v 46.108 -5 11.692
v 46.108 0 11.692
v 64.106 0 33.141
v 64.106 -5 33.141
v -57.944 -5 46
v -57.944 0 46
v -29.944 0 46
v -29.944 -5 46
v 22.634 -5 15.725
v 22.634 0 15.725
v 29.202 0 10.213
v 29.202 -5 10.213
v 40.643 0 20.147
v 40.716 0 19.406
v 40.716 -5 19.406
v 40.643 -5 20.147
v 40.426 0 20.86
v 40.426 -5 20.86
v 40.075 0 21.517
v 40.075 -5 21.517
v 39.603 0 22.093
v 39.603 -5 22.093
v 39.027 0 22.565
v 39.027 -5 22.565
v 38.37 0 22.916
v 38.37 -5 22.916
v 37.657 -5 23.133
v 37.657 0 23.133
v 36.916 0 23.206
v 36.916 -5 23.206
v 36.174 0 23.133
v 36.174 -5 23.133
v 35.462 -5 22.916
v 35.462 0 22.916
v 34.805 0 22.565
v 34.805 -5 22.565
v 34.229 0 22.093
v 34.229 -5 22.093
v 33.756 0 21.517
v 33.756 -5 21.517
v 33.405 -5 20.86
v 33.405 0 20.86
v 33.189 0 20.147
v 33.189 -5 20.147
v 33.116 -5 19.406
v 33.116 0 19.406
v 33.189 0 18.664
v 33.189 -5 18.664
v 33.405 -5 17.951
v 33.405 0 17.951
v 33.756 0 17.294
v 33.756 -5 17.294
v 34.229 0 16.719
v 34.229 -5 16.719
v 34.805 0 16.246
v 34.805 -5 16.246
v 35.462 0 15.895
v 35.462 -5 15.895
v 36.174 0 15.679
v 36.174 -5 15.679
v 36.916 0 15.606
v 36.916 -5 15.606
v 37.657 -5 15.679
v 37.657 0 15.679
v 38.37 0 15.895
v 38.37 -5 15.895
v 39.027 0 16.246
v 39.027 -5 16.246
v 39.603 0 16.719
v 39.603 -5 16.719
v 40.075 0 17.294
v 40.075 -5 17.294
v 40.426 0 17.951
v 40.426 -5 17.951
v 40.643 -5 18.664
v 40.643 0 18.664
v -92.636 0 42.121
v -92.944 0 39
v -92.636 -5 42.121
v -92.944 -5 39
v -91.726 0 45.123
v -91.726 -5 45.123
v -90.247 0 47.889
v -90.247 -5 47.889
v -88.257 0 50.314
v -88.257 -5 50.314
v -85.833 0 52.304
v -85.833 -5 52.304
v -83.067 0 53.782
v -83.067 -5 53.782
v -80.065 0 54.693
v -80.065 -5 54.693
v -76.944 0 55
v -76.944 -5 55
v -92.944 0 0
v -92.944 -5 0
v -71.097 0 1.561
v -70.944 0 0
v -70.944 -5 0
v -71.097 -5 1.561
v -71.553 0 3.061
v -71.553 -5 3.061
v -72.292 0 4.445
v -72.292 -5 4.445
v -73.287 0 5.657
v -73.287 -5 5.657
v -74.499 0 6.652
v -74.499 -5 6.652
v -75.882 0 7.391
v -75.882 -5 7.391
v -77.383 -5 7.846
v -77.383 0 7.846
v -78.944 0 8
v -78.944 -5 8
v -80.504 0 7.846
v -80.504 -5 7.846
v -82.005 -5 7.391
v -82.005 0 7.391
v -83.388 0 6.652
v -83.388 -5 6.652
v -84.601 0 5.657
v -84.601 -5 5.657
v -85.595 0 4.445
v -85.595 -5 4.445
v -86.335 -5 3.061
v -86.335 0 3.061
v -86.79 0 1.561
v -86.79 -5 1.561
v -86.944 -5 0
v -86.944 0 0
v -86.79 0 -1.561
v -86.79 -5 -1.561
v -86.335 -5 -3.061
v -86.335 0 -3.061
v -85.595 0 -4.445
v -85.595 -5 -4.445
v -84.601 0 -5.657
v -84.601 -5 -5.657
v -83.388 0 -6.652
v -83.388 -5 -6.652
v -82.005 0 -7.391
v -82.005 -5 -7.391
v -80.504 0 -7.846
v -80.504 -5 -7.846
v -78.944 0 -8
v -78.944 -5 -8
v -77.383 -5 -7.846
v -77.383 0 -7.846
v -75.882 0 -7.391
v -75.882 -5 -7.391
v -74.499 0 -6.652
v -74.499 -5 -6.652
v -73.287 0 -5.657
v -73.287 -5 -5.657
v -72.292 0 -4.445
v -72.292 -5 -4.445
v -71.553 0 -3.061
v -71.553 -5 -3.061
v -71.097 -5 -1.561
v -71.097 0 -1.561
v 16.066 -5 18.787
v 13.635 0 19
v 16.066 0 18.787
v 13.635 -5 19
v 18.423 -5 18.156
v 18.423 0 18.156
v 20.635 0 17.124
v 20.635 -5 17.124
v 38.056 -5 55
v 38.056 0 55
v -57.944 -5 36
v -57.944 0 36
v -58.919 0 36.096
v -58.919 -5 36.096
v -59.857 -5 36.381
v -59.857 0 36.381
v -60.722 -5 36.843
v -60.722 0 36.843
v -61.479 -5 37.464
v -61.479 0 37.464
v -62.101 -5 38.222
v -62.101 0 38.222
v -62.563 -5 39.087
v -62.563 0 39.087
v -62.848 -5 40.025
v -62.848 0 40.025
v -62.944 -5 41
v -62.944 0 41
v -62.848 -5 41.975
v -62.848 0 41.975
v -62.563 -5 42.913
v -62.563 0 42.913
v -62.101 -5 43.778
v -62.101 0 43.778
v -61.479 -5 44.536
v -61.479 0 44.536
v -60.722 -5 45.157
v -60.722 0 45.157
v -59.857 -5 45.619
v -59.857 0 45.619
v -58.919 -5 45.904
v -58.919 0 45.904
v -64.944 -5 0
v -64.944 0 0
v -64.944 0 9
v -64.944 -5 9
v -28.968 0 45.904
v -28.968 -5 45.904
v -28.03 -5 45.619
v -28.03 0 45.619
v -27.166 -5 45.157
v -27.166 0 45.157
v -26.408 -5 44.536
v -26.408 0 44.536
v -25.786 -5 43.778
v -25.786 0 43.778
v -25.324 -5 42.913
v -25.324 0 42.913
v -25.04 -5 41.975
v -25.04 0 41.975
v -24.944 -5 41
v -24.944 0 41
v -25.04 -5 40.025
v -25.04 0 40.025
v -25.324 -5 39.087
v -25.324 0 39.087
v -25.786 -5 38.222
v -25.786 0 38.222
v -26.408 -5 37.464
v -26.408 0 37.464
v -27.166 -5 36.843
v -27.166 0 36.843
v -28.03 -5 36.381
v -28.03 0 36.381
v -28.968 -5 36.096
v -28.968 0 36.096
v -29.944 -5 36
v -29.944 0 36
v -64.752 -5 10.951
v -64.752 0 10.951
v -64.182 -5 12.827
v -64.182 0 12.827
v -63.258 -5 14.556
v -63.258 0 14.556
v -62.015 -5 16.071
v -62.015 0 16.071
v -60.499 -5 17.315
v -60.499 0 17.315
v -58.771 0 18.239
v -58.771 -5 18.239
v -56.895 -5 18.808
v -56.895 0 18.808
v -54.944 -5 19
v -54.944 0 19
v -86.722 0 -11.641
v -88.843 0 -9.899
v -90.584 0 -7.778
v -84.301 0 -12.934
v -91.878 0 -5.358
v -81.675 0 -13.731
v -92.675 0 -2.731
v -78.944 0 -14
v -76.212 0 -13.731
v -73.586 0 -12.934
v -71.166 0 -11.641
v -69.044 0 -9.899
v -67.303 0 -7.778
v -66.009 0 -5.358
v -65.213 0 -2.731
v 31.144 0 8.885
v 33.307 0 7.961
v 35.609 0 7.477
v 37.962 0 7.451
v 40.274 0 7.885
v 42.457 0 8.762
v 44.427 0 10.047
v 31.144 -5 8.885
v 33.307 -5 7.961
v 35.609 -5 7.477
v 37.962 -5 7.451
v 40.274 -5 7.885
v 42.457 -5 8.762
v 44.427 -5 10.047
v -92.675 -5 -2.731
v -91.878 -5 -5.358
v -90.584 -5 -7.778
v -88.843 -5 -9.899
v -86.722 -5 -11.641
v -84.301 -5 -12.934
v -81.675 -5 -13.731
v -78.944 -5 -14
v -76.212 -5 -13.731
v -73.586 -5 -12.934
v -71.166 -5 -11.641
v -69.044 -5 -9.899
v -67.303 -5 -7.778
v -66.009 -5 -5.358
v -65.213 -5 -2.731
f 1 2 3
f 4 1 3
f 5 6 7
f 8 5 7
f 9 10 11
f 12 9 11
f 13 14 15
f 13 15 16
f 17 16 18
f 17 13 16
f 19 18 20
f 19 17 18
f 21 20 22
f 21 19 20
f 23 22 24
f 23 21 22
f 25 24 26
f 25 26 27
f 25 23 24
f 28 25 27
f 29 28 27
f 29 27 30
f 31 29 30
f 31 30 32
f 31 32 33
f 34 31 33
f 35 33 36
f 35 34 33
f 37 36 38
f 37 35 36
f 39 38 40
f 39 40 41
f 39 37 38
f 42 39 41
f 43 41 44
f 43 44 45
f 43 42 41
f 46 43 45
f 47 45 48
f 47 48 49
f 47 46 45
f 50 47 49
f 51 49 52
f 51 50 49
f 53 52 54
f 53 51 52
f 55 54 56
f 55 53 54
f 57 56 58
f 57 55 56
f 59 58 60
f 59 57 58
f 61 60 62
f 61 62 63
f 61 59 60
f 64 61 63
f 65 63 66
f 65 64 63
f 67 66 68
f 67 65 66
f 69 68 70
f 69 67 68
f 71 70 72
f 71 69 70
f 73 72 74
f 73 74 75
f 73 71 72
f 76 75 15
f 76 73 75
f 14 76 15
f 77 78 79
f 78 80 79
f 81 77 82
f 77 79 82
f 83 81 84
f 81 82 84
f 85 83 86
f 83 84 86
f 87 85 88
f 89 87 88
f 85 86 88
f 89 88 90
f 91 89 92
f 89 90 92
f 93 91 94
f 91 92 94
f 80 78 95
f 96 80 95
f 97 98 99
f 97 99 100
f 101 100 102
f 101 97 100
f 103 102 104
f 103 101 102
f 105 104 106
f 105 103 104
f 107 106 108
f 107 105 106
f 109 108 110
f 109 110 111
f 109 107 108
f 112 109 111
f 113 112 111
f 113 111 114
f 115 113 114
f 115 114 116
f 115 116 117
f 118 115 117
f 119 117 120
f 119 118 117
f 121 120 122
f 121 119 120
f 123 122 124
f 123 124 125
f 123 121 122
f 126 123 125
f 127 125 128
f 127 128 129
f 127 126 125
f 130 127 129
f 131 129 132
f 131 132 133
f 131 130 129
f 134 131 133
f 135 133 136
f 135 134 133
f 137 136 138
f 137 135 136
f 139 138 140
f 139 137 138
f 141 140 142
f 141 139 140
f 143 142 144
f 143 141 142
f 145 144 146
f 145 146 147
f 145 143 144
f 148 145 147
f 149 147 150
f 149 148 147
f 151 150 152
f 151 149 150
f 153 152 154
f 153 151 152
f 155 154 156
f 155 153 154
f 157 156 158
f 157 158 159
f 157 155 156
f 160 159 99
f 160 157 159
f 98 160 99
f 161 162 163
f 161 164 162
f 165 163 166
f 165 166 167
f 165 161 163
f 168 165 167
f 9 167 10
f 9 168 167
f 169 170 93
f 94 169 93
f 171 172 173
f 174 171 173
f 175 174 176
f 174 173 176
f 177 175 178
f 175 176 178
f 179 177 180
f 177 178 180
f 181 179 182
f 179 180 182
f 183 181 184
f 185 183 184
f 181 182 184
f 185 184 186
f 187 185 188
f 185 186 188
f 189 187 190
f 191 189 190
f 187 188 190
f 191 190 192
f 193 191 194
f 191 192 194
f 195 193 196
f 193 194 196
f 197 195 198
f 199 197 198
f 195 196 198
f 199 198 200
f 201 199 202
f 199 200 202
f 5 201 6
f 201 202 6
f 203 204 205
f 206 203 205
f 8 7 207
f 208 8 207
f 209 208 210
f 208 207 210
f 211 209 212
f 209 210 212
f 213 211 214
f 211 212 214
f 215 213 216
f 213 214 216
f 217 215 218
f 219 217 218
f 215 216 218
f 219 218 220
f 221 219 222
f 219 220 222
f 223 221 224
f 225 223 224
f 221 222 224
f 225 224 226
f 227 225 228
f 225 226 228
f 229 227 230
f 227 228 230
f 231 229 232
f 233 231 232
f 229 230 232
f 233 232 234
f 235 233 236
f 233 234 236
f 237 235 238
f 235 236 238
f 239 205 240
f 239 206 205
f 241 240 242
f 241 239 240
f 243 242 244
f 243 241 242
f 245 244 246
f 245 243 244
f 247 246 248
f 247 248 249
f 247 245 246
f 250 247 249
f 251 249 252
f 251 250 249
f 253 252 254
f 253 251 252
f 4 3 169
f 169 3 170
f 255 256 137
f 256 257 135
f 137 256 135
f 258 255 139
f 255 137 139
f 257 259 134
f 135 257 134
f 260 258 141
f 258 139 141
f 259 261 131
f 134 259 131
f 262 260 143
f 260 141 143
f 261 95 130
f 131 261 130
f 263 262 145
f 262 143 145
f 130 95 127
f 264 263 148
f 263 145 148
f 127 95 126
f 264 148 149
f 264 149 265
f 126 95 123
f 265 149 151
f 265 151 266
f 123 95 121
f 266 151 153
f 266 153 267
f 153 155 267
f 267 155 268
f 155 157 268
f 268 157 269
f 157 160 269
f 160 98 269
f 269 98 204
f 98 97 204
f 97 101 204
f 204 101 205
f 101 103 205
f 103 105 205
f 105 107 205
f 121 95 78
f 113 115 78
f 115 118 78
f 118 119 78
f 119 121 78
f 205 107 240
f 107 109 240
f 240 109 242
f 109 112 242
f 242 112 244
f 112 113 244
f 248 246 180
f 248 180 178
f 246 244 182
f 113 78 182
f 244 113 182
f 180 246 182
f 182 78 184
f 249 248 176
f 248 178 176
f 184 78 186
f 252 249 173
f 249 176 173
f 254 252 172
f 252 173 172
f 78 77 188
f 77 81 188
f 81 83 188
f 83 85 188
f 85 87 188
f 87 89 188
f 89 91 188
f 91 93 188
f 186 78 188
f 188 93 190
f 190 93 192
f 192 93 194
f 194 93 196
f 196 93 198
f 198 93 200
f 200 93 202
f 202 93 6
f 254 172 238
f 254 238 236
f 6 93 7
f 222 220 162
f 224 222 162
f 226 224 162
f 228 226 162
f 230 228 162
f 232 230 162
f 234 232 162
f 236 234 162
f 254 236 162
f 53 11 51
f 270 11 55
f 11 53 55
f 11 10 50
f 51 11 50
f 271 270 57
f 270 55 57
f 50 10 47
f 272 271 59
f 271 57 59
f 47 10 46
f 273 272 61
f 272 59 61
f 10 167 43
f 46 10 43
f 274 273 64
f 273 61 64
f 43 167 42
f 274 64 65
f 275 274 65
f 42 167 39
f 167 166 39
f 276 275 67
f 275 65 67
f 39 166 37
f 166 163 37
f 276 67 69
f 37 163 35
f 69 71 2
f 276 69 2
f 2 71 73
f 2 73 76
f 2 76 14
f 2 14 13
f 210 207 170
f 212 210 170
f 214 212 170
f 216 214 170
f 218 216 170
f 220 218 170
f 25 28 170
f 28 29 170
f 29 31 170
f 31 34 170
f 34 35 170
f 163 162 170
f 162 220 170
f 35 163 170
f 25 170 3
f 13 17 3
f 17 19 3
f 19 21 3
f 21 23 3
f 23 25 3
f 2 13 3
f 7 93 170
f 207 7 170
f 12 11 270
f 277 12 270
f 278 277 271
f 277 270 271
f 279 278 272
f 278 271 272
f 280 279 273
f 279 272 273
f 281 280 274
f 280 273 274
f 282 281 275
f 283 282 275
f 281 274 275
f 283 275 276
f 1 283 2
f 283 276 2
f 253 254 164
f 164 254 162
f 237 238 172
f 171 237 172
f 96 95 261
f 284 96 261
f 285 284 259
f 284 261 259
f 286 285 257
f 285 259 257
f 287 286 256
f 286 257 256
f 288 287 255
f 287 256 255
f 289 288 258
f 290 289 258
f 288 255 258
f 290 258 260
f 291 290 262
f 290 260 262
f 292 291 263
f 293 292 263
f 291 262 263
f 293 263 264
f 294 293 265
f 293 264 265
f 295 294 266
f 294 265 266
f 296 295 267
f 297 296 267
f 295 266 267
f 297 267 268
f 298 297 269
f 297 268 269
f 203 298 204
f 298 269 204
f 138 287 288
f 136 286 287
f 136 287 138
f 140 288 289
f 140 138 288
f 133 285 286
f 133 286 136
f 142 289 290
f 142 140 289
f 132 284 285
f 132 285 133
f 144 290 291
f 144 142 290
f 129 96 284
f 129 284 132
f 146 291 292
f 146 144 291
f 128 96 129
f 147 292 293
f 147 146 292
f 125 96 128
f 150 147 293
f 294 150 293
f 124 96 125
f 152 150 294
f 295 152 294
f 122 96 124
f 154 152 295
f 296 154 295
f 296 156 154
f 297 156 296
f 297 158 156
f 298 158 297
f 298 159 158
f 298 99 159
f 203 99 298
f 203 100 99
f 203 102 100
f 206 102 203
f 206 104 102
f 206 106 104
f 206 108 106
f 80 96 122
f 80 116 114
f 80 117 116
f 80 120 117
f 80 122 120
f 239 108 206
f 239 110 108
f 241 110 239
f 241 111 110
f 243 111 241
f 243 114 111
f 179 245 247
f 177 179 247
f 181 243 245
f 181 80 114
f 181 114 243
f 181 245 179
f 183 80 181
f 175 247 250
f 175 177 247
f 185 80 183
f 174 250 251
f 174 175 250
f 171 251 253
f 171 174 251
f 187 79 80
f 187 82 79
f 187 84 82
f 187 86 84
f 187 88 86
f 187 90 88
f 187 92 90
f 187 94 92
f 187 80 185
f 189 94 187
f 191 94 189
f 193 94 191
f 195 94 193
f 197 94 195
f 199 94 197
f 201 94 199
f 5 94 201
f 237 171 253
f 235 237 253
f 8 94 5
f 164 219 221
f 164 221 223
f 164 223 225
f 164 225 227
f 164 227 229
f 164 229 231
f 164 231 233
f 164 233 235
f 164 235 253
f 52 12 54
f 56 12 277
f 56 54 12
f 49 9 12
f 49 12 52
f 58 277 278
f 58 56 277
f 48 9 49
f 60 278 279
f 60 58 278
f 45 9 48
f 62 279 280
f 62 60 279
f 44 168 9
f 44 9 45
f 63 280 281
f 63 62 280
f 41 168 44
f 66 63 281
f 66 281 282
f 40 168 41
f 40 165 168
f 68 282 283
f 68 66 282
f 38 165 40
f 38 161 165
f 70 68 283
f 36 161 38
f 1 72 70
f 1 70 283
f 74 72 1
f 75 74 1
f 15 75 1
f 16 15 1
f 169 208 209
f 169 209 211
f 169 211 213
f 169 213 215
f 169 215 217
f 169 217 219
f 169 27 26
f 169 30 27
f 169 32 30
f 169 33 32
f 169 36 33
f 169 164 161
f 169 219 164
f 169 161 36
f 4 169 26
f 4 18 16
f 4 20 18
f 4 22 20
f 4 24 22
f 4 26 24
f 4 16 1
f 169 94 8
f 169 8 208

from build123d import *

# Parameters (mm, degrees)
F0_R     = 8
F0_R_2   = 3.8
F1_DEPTH = 5
F2_R     = 10
F3_R     = 14
F4_R     = 16


with BuildPart() as f1:
    # F0 (on Front) → F1 (new body)
    with BuildSketch(Plane.XZ):
        with BuildLine():
            Line((38.056332, 55), (-92.943668, 55))
            Line((-92.943668, 55), (-92.943668, 0))
            ThreePointArc((-92.943668, 0), (-78.943668, -14), (-64.943668, 0))
            Line((-64.943668, 0), (-64.943668, 19))
            Line((-64.943668, 19), (18.730509, 19))
            Line((18.730509, 19), (29.202295, 10.213128))
            ThreePointArc((29.202295, 10.213128), (37.961615, 7.451325), (46.108279, 11.69221))
            Line((46.108279, 11.69221), (64.106332, 33.141455))
            Line((64.106332, 33.141455), (38.056332, 55))
        make_face()
        with Locations((-78.943668, 0)):
            Circle(F0_R, mode=Mode.SUBTRACT)
        with Locations((36.915746, 19.405662)):
            Circle(F0_R_2, mode=Mode.SUBTRACT)
        with BuildLine():
            ThreePointArc((-57.943668, 36), (-62.943668, 41), (-57.943668, 46))
            Line((-57.943668, 46), (-29.943668, 46))
            ThreePointArc((-29.943668, 46), (-24.943668, 41), (-29.943668, 36))
            Line((-29.943668, 36), (-57.943668, 36))
        make_face(mode=Mode.SUBTRACT)
    extrude(amount=F1_DEPTH)

    # F2
    f2_edges = [f1.edges().sort_by_distance(p)[0] for p in [
        (-64.943668, -2.5, 19),
    ]]
    fillet(f2_edges, radius=F2_R)

    # F3
    f3_edges = [f1.edges().sort_by_distance(p)[0] for p in [
        (18.730509, -2.5, 19),
    ]]
    fillet(f3_edges, radius=F3_R)

    # F4
    f4_edges = [f1.edges().sort_by_distance(p)[0] for p in [
        (-92.943668, -2.5, 55),
    ]]
    fillet(f4_edges, radius=F4_R)


solid = f1.part
